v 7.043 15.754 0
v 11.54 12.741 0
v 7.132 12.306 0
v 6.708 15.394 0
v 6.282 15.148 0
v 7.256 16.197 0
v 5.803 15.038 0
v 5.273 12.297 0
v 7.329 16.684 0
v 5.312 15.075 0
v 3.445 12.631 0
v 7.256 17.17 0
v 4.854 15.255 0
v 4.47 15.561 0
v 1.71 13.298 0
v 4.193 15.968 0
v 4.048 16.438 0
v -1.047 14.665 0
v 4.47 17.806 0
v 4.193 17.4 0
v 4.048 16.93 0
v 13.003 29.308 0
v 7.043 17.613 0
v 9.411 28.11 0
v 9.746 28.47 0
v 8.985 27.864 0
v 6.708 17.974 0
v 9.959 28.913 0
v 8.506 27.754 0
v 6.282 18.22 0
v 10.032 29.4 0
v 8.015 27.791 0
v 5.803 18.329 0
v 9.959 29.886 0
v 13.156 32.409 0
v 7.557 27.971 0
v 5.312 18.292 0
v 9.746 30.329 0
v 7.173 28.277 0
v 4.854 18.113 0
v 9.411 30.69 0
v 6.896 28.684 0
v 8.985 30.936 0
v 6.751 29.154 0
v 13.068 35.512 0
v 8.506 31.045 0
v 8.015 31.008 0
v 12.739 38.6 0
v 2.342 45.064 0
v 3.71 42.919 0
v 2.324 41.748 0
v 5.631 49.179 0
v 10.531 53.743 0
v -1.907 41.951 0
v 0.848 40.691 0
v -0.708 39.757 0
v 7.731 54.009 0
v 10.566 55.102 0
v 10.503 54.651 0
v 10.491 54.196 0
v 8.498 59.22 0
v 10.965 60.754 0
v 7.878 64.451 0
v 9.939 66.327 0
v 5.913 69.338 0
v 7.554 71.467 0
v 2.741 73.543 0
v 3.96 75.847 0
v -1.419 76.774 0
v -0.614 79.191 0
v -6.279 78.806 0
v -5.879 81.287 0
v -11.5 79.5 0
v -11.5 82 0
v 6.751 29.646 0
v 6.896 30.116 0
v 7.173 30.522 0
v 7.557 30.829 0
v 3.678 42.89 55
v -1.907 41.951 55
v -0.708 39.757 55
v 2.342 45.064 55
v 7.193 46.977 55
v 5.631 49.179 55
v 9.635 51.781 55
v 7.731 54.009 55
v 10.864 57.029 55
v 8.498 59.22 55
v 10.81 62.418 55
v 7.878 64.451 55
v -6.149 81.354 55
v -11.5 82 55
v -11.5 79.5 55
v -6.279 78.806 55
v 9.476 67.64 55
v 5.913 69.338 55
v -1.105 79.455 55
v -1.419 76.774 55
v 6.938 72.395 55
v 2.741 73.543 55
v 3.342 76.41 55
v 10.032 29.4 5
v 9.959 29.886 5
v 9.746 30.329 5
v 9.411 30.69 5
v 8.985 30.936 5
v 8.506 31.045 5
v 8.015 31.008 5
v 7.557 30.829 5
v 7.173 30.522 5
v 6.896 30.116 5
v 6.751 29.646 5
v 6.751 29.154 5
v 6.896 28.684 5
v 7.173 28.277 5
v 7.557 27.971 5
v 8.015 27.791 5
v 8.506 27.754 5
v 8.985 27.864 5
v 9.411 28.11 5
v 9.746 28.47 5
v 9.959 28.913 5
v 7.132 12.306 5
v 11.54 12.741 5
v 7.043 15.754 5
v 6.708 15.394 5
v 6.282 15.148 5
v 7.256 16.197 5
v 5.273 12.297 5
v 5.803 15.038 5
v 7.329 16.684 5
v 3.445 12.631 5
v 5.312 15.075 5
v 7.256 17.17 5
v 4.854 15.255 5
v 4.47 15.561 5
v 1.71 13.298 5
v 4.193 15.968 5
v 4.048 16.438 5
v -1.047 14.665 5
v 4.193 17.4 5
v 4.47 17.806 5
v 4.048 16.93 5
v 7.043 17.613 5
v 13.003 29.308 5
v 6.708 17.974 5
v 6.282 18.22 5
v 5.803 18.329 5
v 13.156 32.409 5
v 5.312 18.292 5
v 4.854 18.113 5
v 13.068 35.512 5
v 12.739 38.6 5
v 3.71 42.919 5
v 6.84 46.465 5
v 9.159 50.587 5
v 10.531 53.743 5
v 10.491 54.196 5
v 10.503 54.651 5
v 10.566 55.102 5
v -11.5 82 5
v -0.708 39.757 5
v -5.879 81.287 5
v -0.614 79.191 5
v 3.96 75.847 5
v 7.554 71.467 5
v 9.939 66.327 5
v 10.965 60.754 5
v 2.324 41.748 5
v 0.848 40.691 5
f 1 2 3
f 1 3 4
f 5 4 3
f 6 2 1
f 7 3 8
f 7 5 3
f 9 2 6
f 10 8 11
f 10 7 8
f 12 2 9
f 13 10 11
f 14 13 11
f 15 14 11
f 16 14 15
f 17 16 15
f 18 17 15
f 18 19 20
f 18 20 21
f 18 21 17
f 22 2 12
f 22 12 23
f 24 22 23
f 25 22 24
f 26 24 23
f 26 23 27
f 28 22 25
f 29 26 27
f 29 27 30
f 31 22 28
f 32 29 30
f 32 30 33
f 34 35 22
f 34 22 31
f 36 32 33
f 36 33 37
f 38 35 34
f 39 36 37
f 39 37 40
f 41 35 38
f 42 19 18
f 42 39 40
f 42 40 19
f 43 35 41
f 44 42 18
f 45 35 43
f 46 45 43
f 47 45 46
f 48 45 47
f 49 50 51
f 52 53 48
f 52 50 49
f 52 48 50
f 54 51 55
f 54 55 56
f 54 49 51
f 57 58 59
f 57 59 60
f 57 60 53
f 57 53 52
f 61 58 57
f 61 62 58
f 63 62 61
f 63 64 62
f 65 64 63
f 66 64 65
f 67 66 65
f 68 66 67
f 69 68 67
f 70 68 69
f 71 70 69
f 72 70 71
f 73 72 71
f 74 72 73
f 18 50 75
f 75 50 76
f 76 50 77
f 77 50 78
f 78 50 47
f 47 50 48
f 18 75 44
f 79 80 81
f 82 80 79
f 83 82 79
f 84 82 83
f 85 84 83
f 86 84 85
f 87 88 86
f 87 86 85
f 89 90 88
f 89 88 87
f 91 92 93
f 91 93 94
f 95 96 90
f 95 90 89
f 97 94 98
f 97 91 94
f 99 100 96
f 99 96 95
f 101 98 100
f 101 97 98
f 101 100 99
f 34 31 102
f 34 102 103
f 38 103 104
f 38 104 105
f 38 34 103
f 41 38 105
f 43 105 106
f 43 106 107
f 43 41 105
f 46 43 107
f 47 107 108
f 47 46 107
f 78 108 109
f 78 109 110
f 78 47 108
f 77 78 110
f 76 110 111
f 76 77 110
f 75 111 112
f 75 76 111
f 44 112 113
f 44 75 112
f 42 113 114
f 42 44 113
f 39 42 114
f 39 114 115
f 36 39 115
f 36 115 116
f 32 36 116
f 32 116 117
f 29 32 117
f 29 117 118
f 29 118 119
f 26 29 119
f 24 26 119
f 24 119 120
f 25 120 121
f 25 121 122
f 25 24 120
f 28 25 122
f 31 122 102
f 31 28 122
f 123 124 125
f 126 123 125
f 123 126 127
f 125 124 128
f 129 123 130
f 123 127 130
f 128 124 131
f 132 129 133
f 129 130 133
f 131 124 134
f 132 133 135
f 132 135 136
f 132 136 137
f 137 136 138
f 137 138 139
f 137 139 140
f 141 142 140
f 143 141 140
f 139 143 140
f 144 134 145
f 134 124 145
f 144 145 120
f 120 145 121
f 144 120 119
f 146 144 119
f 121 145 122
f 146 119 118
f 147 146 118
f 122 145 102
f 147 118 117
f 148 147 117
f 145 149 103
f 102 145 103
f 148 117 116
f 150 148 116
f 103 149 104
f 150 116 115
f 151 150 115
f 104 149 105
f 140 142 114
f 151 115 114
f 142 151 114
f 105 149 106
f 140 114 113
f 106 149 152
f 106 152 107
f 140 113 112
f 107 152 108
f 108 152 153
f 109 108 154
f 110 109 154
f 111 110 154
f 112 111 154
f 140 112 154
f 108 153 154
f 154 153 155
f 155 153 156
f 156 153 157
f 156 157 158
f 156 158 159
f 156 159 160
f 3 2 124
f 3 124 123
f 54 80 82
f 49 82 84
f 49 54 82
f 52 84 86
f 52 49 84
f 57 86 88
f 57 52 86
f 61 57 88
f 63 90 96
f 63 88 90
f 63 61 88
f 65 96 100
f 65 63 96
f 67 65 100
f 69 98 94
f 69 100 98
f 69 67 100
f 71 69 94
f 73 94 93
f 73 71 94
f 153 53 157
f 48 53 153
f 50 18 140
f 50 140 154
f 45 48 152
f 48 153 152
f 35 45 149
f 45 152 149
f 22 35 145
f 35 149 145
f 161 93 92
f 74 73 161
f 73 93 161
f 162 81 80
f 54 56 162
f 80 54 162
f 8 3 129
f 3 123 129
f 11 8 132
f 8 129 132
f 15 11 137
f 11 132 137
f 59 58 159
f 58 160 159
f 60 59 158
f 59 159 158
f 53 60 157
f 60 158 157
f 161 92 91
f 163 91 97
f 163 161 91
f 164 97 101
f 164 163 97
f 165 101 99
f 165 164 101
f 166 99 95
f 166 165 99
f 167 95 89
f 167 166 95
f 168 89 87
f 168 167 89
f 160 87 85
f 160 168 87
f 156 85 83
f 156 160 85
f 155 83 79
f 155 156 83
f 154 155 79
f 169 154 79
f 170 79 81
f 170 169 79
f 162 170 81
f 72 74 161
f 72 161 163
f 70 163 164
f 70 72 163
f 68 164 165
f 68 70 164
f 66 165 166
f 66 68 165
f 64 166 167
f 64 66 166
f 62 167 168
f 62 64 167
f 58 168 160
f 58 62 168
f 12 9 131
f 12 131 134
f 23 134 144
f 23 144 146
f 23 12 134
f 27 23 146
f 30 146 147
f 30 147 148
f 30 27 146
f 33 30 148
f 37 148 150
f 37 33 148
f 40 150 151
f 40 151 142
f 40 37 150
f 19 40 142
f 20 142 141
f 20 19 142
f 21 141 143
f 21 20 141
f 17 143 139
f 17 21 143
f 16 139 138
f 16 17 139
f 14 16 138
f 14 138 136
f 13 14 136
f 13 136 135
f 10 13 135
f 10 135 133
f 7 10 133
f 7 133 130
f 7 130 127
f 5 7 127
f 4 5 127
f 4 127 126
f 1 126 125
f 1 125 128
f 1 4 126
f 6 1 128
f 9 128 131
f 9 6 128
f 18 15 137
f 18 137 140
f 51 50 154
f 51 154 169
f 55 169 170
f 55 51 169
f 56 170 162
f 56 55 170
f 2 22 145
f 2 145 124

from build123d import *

# Parameters (mm, degrees)
SKETCH_1_R      = 1.65
EXTRUDE_1_DEPTH = 5
FILLET_2_R      = 4
FILLET_3_R      = 40
FILLET_4_R      = 10
EXTRUDE_2_DEPTH = 55


with BuildPart() as part:
    # 草图1 → 凸台-拉伸1 (new body)
    with BuildSketch(Plane.XY):
        with BuildLine():
            Line((-11.5, 79.5), (-11.5, 82))
            ThreePointArc((-11.5, 82), (6.103622298, 73.512939805), (10.426977744, 54.454442843))
            Line((10.426977744, 54.454442843), (13.41461423, 33.96926032))
            Line((13.41461423, 33.96926032), (11.539893904, 12.741041785))
            Line((11.539893904, 12.741041785), (4.278741136, 12.025251419))
            Line((4.278741136, 12.025251419), (-1.047111461, 14.664575003))
            Line((-1.047111461, 14.664575003), (3.709660575, 42.919402146))
            ThreePointArc((3.709660575, 42.919402146), (1.596827744, 41.204560595), (-0.707567867, 39.757320125))
            Line((-0.707567867, 39.757320125), (-1.906726993, 41.950951222))
            ThreePointArc((-1.906726993, 41.950951222), (7.877576933, 64.450708254), (-11.5, 79.5))
        make_face()
        with Locations((5.679475492, 16.683750627)):
            Circle(SKETCH_1_R, mode=Mode.SUBTRACT)
        with Locations((8.382327473, 29.399669437)):
            Circle(SKETCH_1_R, mode=Mode.SUBTRACT)
    extrude(amount=EXTRUDE_1_DEPTH)

    # 圆角2
    fillet_2_edges = [part.edges().sort_by_distance(p)[0] for p in [
        (10.426977744, 54.454442843, 2.5),
    ]]
    fillet(fillet_2_edges, radius=FILLET_2_R)

    # 圆角3
    fillet_3_edges = [part.edges().sort_by_distance(p)[0] for p in [
        (13.41461423, 33.96926032, 2.5),
    ]]
    fillet(fillet_3_edges, radius=FILLET_3_R)

    # 圆角4
    fillet_4_edges = [part.edges().sort_by_distance(p)[0] for p in [
        (4.278741136, 12.025251419, 2.5),
    ]]
    fillet(fillet_4_edges, radius=FILLET_4_R)

    # 草图2 → 凸台-拉伸2 (add)
    with BuildSketch(Plane(origin=(0, 0, 0), x_dir=(-1, 0, 0), z_dir=(0, 0, -1))):
        with BuildLine():
            Line((11.5, 82), (11.5, 79.5))
            ThreePointArc((11.5, 79.5), (-7.877576933, 64.450708254), (1.906726993, 41.950951222))
            Line((1.906726993, 41.950951222), (0.707567867, 39.757320125))
            ThreePointArc((0.707567867, 39.757320125), (-10.299774049, 65.069546786), (11.5, 82))
        make_face()
    extrude(amount=-EXTRUDE_2_DEPTH)


solid = part.part
